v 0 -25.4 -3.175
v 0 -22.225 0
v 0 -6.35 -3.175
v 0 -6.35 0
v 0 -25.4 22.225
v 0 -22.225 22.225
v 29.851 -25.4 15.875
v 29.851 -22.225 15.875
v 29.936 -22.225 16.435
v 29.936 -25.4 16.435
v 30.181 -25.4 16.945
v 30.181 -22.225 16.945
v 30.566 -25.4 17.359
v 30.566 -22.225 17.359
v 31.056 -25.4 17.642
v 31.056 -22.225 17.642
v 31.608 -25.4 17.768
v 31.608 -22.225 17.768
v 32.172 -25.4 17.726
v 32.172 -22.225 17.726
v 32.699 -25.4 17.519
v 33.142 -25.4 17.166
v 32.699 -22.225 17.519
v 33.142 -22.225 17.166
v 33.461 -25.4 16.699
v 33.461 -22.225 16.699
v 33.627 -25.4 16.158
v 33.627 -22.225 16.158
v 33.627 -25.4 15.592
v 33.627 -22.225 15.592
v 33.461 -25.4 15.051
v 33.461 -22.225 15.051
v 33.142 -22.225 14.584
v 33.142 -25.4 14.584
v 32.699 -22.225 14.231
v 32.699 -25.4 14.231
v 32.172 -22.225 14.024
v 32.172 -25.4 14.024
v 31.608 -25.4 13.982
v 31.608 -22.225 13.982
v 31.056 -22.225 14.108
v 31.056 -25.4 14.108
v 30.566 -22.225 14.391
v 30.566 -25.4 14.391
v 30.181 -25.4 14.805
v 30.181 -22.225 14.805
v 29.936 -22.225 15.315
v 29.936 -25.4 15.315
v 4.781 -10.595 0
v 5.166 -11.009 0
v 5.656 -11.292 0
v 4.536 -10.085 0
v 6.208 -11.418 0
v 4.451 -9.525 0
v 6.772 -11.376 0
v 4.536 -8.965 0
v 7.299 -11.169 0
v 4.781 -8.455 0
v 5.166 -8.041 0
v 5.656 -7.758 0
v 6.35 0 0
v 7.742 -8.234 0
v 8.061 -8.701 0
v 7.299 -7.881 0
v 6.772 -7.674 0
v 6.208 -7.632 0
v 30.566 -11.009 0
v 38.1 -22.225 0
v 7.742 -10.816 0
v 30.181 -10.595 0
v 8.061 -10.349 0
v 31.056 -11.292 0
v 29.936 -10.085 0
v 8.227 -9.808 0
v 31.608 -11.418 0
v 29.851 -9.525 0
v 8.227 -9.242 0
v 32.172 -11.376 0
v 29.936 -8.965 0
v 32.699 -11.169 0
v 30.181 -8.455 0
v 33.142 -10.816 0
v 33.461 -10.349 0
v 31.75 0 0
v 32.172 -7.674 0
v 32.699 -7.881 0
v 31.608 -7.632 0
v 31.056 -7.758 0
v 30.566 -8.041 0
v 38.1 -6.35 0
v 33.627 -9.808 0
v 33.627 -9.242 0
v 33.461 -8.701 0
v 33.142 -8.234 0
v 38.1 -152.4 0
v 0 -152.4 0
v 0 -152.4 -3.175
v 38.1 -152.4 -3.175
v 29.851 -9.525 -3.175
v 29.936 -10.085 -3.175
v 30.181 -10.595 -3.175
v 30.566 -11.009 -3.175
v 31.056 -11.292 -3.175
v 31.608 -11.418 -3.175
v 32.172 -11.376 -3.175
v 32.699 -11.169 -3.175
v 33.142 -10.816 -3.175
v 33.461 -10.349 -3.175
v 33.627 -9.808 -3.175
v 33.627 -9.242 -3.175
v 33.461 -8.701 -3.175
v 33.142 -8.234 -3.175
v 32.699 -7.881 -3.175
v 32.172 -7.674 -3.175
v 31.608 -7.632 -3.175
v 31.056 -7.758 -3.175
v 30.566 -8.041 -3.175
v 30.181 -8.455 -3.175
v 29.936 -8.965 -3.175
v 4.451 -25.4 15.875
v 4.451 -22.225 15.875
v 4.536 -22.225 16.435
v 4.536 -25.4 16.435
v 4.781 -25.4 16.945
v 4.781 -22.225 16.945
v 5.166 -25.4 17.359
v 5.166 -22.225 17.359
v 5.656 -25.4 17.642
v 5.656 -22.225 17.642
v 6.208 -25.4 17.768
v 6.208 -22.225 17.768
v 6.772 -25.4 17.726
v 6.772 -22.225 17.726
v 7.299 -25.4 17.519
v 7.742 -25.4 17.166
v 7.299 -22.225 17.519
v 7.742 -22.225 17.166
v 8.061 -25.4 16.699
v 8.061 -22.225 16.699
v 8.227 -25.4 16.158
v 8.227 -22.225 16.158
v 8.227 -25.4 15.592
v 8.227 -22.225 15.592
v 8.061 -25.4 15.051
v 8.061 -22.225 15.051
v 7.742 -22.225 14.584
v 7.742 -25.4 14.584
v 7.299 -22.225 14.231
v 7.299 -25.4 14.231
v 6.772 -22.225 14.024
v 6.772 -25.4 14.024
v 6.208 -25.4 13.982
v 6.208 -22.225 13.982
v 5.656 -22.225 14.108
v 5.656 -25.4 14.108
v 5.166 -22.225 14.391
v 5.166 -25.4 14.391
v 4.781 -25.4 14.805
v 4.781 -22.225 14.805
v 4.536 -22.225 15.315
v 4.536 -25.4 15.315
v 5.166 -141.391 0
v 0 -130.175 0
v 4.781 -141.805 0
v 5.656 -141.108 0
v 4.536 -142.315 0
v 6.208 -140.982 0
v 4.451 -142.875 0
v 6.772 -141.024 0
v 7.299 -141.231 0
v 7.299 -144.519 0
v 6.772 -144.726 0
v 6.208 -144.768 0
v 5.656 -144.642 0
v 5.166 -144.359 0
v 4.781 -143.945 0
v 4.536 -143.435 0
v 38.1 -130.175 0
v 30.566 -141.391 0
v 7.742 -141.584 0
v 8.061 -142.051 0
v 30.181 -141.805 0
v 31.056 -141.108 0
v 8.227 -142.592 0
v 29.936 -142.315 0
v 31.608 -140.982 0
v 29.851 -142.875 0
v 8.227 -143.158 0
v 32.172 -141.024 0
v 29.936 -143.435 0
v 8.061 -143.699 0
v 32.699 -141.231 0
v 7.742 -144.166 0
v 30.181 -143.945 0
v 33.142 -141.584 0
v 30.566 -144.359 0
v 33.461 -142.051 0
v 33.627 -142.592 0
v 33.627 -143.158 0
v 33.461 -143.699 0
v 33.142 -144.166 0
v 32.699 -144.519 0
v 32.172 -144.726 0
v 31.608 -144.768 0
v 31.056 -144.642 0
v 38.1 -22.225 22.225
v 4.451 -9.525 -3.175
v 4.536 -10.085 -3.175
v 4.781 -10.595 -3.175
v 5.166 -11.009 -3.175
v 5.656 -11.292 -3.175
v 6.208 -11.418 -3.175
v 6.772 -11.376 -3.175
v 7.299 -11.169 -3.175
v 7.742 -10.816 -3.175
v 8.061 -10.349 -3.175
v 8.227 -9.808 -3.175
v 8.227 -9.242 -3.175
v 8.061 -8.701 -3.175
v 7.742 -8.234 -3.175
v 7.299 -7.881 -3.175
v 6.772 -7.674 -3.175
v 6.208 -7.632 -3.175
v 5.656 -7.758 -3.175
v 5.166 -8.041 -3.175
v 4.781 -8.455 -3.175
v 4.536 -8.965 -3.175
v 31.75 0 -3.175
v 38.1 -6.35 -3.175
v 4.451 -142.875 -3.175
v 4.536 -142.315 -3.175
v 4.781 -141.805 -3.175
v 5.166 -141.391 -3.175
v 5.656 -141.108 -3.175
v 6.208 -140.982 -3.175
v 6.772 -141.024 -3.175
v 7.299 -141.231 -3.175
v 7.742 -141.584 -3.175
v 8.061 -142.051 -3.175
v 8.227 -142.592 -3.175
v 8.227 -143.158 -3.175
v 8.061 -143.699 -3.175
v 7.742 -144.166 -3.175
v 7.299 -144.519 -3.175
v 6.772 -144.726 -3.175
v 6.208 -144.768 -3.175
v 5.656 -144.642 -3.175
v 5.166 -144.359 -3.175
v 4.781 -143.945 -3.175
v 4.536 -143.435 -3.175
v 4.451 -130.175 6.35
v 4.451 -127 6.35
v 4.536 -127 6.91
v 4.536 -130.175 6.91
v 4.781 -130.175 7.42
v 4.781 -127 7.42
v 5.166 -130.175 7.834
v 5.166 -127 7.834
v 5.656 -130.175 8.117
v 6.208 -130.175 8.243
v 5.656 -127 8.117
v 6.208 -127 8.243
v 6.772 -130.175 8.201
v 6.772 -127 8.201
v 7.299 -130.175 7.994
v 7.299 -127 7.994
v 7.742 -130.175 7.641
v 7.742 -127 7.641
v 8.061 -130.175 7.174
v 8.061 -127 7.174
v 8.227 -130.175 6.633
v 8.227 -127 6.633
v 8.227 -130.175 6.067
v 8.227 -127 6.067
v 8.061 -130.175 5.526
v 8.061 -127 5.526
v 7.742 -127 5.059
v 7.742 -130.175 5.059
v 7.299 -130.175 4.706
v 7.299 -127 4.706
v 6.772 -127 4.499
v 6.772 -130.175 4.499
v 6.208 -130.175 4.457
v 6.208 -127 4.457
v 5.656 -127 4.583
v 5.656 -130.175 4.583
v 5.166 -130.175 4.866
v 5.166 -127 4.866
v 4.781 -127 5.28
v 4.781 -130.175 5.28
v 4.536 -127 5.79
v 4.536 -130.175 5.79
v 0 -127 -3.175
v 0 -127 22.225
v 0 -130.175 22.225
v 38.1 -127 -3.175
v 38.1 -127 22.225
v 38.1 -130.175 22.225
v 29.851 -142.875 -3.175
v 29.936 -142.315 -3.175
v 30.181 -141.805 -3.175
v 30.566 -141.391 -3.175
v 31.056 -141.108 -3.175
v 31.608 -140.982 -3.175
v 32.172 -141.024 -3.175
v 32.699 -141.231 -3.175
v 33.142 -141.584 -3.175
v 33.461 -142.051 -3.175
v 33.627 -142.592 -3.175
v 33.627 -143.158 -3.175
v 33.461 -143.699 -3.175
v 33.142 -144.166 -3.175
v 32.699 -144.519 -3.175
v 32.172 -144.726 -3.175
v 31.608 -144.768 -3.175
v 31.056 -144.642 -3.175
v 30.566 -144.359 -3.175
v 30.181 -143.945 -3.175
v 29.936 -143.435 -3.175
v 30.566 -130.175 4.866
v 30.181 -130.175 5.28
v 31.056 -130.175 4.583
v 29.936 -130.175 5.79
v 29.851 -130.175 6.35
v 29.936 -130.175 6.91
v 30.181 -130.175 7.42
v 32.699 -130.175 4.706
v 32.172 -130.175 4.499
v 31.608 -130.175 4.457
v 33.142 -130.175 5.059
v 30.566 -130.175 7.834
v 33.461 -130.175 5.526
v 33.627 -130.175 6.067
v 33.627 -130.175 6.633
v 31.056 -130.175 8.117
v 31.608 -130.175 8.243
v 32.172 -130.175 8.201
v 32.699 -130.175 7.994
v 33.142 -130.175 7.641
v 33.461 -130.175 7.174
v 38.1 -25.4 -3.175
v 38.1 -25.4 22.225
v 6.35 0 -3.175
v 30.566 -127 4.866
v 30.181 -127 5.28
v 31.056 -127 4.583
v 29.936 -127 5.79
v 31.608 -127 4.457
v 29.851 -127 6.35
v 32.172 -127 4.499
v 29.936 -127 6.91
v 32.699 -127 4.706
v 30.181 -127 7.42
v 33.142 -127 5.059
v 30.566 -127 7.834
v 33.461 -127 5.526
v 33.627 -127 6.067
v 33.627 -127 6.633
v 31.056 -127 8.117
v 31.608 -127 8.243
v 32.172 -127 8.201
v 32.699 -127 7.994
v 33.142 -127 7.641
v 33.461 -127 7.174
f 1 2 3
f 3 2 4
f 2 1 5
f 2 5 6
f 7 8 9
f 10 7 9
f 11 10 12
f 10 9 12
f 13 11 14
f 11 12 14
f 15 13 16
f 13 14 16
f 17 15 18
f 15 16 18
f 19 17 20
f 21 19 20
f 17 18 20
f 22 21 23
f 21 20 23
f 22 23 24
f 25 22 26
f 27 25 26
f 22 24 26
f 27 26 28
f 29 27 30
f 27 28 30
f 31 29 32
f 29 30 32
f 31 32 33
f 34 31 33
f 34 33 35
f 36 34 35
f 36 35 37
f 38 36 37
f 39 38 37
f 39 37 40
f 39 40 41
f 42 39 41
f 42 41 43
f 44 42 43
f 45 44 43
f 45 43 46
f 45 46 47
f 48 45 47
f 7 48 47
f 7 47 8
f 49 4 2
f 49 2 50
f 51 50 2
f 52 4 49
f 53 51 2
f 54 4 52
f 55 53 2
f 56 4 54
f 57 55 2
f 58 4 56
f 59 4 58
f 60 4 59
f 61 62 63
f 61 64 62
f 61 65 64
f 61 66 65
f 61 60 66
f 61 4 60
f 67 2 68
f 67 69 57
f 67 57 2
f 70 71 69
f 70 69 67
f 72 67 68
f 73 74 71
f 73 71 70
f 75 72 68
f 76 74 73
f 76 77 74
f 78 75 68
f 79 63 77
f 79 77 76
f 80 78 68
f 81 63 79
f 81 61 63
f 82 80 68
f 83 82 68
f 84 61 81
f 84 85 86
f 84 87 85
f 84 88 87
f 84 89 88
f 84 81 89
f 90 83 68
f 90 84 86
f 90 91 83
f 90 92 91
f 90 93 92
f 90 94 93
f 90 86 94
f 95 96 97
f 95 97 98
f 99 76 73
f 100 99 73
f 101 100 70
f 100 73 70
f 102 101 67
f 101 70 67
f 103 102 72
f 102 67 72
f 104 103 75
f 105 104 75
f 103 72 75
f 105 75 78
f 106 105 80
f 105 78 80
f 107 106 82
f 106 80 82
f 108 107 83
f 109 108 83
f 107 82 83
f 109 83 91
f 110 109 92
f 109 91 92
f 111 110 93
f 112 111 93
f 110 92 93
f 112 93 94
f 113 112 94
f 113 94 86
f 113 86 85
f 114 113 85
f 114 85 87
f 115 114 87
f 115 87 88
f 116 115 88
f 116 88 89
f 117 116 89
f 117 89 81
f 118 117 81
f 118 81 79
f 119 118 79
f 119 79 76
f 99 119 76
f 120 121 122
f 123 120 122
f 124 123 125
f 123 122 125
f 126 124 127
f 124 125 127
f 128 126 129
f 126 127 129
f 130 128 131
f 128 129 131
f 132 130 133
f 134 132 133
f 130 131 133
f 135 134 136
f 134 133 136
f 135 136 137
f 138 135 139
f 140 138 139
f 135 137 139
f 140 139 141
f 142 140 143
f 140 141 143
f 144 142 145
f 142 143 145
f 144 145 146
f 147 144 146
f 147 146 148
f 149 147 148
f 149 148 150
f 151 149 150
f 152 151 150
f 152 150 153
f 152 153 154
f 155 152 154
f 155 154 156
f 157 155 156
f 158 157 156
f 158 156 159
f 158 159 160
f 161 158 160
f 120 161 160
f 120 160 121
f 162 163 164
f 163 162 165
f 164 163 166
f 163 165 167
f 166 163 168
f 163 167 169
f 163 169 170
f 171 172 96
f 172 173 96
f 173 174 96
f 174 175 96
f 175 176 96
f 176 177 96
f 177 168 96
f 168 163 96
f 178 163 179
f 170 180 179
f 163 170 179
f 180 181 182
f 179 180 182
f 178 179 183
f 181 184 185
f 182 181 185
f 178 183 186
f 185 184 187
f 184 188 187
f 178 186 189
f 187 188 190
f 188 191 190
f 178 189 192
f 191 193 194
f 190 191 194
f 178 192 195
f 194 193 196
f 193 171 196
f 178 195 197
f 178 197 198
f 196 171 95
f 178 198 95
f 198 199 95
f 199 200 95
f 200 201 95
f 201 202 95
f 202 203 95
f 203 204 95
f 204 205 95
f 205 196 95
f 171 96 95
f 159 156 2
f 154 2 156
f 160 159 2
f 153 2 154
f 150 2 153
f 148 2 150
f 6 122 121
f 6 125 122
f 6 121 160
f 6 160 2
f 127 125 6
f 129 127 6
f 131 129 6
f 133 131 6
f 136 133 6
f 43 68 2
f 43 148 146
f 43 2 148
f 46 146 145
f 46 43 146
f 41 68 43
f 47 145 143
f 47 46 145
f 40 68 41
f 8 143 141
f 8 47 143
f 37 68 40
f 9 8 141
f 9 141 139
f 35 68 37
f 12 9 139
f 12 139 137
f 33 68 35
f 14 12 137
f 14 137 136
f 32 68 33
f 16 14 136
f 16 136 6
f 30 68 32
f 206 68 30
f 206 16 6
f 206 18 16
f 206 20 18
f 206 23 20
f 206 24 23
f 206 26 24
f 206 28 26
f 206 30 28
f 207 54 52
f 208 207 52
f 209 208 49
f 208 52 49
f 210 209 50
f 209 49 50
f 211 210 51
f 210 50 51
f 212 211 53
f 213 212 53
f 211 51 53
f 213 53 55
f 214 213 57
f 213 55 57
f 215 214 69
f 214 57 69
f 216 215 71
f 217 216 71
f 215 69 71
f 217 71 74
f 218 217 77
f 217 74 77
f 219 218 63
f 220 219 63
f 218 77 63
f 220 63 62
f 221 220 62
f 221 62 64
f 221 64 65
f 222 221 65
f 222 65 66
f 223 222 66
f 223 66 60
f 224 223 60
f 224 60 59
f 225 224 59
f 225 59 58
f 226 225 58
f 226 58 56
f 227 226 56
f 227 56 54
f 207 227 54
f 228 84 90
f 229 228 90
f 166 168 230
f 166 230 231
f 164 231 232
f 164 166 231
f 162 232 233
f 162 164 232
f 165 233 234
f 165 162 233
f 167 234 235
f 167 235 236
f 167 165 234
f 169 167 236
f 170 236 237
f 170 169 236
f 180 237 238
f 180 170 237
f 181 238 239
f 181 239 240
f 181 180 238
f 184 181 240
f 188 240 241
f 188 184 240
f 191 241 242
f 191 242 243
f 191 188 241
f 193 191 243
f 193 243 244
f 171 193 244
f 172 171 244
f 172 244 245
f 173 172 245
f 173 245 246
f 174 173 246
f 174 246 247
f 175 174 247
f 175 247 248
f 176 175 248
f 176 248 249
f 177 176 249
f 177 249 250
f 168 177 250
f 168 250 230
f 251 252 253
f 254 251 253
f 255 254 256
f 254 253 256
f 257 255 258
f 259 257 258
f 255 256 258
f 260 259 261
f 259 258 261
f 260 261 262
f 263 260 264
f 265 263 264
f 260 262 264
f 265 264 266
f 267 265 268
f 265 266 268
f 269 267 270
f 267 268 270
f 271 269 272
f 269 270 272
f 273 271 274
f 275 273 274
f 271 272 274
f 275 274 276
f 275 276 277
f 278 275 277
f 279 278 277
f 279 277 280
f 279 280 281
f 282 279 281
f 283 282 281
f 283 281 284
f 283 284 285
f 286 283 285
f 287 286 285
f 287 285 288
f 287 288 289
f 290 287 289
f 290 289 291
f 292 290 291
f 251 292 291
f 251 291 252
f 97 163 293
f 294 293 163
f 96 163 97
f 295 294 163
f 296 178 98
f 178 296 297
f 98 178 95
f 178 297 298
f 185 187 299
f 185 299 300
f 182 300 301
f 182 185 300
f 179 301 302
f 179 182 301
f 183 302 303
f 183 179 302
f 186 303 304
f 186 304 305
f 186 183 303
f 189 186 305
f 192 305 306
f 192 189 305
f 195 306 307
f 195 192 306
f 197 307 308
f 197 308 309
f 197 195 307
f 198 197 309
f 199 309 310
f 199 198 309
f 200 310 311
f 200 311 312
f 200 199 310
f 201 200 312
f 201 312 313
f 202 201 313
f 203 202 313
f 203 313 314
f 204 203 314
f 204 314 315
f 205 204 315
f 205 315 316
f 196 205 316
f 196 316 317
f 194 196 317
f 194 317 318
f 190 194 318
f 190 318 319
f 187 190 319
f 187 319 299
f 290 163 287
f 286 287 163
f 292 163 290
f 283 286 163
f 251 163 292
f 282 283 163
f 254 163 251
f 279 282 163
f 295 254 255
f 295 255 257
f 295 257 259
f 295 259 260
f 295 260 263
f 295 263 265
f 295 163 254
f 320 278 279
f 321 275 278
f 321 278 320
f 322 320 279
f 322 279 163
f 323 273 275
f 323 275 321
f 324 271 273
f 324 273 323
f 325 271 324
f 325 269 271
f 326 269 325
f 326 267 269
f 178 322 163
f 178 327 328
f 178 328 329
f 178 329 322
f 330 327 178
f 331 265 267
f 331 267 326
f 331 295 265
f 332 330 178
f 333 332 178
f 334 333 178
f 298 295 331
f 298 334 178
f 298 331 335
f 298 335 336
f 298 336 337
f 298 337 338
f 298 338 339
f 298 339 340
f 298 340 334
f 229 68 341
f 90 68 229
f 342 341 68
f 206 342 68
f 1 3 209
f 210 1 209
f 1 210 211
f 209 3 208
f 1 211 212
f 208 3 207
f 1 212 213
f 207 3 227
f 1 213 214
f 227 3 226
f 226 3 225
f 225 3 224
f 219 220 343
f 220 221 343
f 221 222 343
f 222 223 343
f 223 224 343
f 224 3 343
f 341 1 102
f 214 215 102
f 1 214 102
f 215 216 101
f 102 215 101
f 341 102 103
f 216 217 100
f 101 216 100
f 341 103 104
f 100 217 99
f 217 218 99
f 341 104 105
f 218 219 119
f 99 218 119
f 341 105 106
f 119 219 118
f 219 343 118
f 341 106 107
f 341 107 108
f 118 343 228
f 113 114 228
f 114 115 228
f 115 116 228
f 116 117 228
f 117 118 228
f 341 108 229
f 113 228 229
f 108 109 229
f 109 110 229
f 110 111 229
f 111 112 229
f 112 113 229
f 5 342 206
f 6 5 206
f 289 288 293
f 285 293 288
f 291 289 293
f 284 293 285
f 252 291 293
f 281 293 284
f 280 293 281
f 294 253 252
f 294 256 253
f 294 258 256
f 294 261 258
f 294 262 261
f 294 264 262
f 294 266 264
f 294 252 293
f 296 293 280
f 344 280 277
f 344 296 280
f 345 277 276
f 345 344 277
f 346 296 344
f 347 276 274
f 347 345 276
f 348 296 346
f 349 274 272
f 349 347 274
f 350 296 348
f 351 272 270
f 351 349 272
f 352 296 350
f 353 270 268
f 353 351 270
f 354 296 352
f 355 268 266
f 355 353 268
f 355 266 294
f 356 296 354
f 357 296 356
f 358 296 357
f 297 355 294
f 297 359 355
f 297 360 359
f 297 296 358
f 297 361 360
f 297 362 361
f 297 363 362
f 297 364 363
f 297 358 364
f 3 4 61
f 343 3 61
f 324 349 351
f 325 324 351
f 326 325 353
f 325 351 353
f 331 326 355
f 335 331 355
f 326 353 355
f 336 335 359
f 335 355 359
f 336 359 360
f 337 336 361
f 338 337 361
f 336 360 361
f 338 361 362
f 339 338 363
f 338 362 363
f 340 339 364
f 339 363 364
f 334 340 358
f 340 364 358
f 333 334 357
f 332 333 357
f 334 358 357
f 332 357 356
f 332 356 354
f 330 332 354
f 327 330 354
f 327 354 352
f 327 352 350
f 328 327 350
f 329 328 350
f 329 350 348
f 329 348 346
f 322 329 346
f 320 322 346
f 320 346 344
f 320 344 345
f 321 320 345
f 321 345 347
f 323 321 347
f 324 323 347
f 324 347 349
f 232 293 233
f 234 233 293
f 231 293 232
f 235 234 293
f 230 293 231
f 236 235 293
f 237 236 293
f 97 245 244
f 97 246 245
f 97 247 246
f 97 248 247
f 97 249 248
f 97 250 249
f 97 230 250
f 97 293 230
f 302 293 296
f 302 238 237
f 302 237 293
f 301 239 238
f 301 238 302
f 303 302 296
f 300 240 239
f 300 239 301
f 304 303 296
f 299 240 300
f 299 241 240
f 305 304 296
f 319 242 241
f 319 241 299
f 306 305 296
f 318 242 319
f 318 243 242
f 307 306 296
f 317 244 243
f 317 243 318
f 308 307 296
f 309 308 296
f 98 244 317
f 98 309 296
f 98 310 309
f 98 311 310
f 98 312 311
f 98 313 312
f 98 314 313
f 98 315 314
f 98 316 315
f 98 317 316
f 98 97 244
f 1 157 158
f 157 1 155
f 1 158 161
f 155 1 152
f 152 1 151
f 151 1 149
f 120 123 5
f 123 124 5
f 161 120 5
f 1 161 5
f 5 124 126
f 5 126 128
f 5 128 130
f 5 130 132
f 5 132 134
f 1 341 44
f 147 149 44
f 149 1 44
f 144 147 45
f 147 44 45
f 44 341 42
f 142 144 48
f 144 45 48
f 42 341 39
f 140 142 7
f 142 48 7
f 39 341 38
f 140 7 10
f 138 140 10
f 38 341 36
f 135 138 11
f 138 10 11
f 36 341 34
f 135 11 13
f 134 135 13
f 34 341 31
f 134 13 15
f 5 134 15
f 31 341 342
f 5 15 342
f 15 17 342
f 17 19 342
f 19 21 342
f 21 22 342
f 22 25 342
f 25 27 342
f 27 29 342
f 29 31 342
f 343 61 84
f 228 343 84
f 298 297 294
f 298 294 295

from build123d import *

# Parameters (mm, degrees)
F0_W      = 38.1
F0_H      = 3.175
F1_DEPTH  = 25.4
F2_W      = 3.175
F2_H      = 22.225
F3_DEPTH  = 38.1
F5_D      = 3.7973
F5_DEPTH  = 12.7
F5_TIP    = 1.1408240143
F7_D      = 3.7973
F7_DEPTH  = 12.7
F7_TIP    = 1.1408240143
F10_R     = 3.3782
F10_R_2   = 1.89865
F11_DEPTH = 3.175
F14_D     = 3.7973
F14_DEPTH = 12.7
F14_TIP   = 1.1408240143
F15_R     = 1.89865
F16_DEPTH = 3.175
F18_DEPTH = 25.4


with BuildPart() as f1:
    # F0 (on Front) → F1 (new body)
    with BuildSketch(Plane.XZ):
        with Locations((19.05, -1.5875)):
            Rectangle(F0_W, F0_H)
    extrude(amount=F1_DEPTH)

    # F2 (on face) → F3 (join)
    with BuildSketch(Plane.YZ.offset(38.1)):
        with Locations((-23.8125, 11.1125)):
            Rectangle(F2_W, F2_H)
    extrude(amount=-F3_DEPTH)

    # F5
    with Locations(Plane.XZ.offset(25.4)):
        with Locations((6.35, 15.875), (31.75, 15.875)):
            Hole(F5_D / 2, depth=F5_DEPTH)
            with Locations((0, 0, -(F5_DEPTH + F5_TIP / 2))):  # 118° drill point
                Cone(0, F5_D / 2, F5_TIP, mode=Mode.SUBTRACT)

    # F7
    with Locations(Plane(origin=(0, 0, -3.175), x_dir=(1, 0, 0), z_dir=(0, 0, -1))):
        with Locations((6.35, 9.525), (31.75, 9.525)):
            Hole(F7_D / 2, depth=F7_DEPTH)
            with Locations((0, 0, -(F7_DEPTH + F7_TIP / 2))):  # 118° drill point
                Cone(0, F7_D / 2, F7_TIP, mode=Mode.SUBTRACT)


with BuildPart() as f9_1:
    # F9: instance of F1
    add(f1.part.mirror(Plane(origin=(19.05, -76.2, 9.3728155466), x_dir=(1, 0, 0), z_dir=(0, -1, 0))))


with BuildPart() as f11:
    # F10 (on face) → F11 (new body)
    with BuildSketch(Plane.XZ.offset(130.175)):
        with Locations((6.35, 15.875)):
            Circle(F10_R)
        with Locations((6.35, 15.875)):
            Circle(F10_R_2, mode=Mode.SUBTRACT)
    extrude(amount=-F11_DEPTH)

    # F12: union F9_1
    add(f9_1.part)

    # F14
    with Locations(Plane.XZ.offset(130.175)):
        with Locations((31.75, 6.35), (6.35, 6.35)):
            Hole(F14_D / 2, depth=F14_DEPTH)
            with Locations((0, 0, -(F14_DEPTH + F14_TIP / 2))):  # 118° drill point
                Cone(0, F14_D / 2, F14_TIP, mode=Mode.SUBTRACT)

    # F15 (on face) → F16 (join)
    with BuildSketch(Plane.XZ.offset(130.175)):
        with Locations((6.35, 15.875)):
            Circle(F15_R)
        with Locations((31.75, 15.875)):
            Circle(F15_R)
    extrude(amount=-F16_DEPTH)


with BuildPart() as f1_1:
    add(f1.part)

    # F17 (on face) → F18 (cut)
    with BuildSketch(Plane.XY):
        Polygon((6.35, 0), (0, 0), (0, -6.35), align=None)
        Polygon((38.1, 0), (31.75, 0), (38.1, -6.35), align=None)
    extrude(amount=-F18_DEPTH, mode=Mode.SUBTRACT)


solid = Compound([f11.part, f1_1.part])
